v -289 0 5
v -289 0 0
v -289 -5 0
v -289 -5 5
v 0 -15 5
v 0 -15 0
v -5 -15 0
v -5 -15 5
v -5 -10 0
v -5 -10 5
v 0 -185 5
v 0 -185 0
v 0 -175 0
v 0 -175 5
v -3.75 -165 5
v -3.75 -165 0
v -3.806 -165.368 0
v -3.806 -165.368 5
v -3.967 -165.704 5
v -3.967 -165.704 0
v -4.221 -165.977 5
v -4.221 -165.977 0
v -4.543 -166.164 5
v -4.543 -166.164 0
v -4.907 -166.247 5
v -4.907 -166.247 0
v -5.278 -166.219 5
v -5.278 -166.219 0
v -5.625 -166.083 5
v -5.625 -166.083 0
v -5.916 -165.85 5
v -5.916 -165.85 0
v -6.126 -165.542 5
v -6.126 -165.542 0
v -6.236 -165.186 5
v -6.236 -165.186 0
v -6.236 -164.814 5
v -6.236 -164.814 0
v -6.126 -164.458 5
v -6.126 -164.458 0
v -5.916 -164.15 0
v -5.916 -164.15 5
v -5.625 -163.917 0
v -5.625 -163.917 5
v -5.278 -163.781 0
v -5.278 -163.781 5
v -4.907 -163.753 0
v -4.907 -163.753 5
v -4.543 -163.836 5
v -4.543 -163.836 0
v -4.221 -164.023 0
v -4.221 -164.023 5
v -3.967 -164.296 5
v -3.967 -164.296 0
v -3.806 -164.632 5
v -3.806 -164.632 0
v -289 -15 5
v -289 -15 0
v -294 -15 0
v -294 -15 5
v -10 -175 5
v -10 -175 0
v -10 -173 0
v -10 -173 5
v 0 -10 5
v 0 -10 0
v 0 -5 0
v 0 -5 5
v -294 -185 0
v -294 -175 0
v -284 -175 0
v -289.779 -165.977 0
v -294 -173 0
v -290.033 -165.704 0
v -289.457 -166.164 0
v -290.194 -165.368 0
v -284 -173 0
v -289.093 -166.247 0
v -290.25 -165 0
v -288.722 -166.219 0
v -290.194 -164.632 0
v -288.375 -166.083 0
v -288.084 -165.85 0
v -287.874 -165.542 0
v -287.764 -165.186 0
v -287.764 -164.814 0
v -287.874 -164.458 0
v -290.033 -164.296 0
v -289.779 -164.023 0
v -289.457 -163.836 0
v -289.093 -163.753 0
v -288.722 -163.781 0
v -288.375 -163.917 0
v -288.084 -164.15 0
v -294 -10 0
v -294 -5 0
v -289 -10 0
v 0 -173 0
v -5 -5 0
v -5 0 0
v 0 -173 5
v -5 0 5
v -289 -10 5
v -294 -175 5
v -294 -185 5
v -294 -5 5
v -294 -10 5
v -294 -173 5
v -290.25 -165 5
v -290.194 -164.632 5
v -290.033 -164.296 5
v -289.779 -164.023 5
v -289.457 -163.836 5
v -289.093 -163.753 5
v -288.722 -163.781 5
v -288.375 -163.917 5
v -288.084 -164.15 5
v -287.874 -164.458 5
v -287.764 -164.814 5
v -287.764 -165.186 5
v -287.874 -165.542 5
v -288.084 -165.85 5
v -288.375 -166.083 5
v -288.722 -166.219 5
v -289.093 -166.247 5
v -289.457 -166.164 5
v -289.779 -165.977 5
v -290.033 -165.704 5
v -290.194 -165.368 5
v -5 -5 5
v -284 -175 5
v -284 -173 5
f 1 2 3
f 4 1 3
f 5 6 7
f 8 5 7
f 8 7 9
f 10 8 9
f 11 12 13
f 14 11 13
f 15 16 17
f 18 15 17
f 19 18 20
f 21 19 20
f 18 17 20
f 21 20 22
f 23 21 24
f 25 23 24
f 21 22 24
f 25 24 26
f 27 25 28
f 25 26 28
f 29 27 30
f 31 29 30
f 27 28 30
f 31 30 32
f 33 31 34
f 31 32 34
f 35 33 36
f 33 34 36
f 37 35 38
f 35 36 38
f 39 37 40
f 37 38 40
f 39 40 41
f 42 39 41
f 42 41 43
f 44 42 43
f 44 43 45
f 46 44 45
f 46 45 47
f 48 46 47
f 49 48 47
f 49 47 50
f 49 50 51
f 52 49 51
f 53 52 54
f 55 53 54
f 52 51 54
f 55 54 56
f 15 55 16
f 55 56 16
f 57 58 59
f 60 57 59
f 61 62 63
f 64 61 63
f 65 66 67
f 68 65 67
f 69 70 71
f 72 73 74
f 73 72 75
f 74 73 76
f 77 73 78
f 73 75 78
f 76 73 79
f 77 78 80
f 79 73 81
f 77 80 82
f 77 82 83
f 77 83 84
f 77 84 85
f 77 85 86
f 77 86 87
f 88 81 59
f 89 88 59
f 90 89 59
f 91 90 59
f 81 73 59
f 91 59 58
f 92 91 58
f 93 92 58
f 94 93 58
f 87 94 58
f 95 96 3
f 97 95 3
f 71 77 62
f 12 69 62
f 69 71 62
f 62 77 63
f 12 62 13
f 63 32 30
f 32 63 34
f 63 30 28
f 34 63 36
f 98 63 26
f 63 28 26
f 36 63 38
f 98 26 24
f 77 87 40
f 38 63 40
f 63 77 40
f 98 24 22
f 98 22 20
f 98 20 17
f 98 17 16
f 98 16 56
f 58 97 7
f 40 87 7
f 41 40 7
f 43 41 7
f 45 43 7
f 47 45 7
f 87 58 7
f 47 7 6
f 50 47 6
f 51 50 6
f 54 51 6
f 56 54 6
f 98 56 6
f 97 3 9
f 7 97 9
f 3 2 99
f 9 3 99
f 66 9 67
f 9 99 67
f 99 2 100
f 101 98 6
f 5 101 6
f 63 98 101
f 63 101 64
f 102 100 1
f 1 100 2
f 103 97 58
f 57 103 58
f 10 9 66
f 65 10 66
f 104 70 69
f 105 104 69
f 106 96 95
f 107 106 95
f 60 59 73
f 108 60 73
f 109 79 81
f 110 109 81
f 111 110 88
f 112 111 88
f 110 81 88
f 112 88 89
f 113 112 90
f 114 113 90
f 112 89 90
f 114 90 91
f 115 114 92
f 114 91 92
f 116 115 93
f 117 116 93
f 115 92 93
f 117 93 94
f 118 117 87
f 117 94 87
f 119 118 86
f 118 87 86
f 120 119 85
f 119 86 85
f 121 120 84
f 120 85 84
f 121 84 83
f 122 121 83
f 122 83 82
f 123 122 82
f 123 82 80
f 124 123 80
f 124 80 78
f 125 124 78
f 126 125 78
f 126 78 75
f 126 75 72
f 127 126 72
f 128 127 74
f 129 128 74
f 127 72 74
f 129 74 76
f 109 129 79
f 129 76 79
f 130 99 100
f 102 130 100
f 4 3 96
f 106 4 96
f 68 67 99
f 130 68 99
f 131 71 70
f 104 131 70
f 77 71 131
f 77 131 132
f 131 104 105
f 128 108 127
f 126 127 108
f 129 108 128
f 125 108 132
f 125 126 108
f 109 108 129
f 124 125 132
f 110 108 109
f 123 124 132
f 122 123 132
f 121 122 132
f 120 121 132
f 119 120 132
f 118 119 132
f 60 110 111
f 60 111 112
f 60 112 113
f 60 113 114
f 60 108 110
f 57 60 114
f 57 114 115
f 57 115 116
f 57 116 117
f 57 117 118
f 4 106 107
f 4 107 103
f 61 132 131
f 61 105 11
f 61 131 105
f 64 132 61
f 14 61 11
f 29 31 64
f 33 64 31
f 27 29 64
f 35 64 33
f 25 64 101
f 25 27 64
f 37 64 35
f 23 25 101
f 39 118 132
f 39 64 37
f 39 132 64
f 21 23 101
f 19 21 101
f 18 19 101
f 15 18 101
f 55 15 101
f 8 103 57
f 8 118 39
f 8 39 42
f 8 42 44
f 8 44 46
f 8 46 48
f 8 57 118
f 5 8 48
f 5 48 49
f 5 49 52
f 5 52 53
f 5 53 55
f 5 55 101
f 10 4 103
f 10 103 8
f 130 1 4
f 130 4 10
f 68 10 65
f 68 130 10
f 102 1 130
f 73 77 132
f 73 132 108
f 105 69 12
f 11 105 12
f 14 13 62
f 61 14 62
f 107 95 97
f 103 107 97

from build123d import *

# Parameters (mm, degrees)
BOSS_EXTRUDE1_DEPTH = 5
SKETCH2_W           = 10
SKETCH2_H           = 2
CUT_EXTRUDE1_DEPTH  = 5
SKETCH3_R           = 1.25
CUT_EXTRUDE2_DEPTH  = 5


with BuildPart() as part:
    # Sketch1 → Boss-Extrude1 (new body)
    with BuildSketch(Plane.XY):
        Polygon((-5, -5), (-5, 0), (-289, 0), (-289, -5), (-294, -5), (-294, -10), (-289, -10), (-289, -15), (-294, -15), (-294, -185), (0, -185), (0, -15), (-5, -15), (-5, -10), (0, -10), (0, -5), align=None)
    extrude(amount=BOSS_EXTRUDE1_DEPTH)

    # Sketch2 → Cut-Extrude1 (cut)
    with BuildSketch(Plane(origin=(0, 0, 0), x_dir=(-1, 0, 0), z_dir=(0, 0, -1))):
        with Locations((289, -174)):
            Rectangle(SKETCH2_W, SKETCH2_H)
        with Locations((5, -174)):
            Rectangle(SKETCH2_W, SKETCH2_H)
    extrude(amount=-CUT_EXTRUDE1_DEPTH, mode=Mode.SUBTRACT)

    # Sketch3 → Cut-Extrude2 (cut)
    with BuildSketch(Plane(origin=(0, 0, 0), x_dir=(-1, 0, 0), z_dir=(0, 0, -1))):
        with Locations((289, -165)):
            Circle(SKETCH3_R)
        with Locations(Location((5, -165, 0), (0, 0, 180))):
            Circle(SKETCH3_R)
    extrude(amount=-CUT_EXTRUDE2_DEPTH, mode=Mode.SUBTRACT)


solid = part.part
